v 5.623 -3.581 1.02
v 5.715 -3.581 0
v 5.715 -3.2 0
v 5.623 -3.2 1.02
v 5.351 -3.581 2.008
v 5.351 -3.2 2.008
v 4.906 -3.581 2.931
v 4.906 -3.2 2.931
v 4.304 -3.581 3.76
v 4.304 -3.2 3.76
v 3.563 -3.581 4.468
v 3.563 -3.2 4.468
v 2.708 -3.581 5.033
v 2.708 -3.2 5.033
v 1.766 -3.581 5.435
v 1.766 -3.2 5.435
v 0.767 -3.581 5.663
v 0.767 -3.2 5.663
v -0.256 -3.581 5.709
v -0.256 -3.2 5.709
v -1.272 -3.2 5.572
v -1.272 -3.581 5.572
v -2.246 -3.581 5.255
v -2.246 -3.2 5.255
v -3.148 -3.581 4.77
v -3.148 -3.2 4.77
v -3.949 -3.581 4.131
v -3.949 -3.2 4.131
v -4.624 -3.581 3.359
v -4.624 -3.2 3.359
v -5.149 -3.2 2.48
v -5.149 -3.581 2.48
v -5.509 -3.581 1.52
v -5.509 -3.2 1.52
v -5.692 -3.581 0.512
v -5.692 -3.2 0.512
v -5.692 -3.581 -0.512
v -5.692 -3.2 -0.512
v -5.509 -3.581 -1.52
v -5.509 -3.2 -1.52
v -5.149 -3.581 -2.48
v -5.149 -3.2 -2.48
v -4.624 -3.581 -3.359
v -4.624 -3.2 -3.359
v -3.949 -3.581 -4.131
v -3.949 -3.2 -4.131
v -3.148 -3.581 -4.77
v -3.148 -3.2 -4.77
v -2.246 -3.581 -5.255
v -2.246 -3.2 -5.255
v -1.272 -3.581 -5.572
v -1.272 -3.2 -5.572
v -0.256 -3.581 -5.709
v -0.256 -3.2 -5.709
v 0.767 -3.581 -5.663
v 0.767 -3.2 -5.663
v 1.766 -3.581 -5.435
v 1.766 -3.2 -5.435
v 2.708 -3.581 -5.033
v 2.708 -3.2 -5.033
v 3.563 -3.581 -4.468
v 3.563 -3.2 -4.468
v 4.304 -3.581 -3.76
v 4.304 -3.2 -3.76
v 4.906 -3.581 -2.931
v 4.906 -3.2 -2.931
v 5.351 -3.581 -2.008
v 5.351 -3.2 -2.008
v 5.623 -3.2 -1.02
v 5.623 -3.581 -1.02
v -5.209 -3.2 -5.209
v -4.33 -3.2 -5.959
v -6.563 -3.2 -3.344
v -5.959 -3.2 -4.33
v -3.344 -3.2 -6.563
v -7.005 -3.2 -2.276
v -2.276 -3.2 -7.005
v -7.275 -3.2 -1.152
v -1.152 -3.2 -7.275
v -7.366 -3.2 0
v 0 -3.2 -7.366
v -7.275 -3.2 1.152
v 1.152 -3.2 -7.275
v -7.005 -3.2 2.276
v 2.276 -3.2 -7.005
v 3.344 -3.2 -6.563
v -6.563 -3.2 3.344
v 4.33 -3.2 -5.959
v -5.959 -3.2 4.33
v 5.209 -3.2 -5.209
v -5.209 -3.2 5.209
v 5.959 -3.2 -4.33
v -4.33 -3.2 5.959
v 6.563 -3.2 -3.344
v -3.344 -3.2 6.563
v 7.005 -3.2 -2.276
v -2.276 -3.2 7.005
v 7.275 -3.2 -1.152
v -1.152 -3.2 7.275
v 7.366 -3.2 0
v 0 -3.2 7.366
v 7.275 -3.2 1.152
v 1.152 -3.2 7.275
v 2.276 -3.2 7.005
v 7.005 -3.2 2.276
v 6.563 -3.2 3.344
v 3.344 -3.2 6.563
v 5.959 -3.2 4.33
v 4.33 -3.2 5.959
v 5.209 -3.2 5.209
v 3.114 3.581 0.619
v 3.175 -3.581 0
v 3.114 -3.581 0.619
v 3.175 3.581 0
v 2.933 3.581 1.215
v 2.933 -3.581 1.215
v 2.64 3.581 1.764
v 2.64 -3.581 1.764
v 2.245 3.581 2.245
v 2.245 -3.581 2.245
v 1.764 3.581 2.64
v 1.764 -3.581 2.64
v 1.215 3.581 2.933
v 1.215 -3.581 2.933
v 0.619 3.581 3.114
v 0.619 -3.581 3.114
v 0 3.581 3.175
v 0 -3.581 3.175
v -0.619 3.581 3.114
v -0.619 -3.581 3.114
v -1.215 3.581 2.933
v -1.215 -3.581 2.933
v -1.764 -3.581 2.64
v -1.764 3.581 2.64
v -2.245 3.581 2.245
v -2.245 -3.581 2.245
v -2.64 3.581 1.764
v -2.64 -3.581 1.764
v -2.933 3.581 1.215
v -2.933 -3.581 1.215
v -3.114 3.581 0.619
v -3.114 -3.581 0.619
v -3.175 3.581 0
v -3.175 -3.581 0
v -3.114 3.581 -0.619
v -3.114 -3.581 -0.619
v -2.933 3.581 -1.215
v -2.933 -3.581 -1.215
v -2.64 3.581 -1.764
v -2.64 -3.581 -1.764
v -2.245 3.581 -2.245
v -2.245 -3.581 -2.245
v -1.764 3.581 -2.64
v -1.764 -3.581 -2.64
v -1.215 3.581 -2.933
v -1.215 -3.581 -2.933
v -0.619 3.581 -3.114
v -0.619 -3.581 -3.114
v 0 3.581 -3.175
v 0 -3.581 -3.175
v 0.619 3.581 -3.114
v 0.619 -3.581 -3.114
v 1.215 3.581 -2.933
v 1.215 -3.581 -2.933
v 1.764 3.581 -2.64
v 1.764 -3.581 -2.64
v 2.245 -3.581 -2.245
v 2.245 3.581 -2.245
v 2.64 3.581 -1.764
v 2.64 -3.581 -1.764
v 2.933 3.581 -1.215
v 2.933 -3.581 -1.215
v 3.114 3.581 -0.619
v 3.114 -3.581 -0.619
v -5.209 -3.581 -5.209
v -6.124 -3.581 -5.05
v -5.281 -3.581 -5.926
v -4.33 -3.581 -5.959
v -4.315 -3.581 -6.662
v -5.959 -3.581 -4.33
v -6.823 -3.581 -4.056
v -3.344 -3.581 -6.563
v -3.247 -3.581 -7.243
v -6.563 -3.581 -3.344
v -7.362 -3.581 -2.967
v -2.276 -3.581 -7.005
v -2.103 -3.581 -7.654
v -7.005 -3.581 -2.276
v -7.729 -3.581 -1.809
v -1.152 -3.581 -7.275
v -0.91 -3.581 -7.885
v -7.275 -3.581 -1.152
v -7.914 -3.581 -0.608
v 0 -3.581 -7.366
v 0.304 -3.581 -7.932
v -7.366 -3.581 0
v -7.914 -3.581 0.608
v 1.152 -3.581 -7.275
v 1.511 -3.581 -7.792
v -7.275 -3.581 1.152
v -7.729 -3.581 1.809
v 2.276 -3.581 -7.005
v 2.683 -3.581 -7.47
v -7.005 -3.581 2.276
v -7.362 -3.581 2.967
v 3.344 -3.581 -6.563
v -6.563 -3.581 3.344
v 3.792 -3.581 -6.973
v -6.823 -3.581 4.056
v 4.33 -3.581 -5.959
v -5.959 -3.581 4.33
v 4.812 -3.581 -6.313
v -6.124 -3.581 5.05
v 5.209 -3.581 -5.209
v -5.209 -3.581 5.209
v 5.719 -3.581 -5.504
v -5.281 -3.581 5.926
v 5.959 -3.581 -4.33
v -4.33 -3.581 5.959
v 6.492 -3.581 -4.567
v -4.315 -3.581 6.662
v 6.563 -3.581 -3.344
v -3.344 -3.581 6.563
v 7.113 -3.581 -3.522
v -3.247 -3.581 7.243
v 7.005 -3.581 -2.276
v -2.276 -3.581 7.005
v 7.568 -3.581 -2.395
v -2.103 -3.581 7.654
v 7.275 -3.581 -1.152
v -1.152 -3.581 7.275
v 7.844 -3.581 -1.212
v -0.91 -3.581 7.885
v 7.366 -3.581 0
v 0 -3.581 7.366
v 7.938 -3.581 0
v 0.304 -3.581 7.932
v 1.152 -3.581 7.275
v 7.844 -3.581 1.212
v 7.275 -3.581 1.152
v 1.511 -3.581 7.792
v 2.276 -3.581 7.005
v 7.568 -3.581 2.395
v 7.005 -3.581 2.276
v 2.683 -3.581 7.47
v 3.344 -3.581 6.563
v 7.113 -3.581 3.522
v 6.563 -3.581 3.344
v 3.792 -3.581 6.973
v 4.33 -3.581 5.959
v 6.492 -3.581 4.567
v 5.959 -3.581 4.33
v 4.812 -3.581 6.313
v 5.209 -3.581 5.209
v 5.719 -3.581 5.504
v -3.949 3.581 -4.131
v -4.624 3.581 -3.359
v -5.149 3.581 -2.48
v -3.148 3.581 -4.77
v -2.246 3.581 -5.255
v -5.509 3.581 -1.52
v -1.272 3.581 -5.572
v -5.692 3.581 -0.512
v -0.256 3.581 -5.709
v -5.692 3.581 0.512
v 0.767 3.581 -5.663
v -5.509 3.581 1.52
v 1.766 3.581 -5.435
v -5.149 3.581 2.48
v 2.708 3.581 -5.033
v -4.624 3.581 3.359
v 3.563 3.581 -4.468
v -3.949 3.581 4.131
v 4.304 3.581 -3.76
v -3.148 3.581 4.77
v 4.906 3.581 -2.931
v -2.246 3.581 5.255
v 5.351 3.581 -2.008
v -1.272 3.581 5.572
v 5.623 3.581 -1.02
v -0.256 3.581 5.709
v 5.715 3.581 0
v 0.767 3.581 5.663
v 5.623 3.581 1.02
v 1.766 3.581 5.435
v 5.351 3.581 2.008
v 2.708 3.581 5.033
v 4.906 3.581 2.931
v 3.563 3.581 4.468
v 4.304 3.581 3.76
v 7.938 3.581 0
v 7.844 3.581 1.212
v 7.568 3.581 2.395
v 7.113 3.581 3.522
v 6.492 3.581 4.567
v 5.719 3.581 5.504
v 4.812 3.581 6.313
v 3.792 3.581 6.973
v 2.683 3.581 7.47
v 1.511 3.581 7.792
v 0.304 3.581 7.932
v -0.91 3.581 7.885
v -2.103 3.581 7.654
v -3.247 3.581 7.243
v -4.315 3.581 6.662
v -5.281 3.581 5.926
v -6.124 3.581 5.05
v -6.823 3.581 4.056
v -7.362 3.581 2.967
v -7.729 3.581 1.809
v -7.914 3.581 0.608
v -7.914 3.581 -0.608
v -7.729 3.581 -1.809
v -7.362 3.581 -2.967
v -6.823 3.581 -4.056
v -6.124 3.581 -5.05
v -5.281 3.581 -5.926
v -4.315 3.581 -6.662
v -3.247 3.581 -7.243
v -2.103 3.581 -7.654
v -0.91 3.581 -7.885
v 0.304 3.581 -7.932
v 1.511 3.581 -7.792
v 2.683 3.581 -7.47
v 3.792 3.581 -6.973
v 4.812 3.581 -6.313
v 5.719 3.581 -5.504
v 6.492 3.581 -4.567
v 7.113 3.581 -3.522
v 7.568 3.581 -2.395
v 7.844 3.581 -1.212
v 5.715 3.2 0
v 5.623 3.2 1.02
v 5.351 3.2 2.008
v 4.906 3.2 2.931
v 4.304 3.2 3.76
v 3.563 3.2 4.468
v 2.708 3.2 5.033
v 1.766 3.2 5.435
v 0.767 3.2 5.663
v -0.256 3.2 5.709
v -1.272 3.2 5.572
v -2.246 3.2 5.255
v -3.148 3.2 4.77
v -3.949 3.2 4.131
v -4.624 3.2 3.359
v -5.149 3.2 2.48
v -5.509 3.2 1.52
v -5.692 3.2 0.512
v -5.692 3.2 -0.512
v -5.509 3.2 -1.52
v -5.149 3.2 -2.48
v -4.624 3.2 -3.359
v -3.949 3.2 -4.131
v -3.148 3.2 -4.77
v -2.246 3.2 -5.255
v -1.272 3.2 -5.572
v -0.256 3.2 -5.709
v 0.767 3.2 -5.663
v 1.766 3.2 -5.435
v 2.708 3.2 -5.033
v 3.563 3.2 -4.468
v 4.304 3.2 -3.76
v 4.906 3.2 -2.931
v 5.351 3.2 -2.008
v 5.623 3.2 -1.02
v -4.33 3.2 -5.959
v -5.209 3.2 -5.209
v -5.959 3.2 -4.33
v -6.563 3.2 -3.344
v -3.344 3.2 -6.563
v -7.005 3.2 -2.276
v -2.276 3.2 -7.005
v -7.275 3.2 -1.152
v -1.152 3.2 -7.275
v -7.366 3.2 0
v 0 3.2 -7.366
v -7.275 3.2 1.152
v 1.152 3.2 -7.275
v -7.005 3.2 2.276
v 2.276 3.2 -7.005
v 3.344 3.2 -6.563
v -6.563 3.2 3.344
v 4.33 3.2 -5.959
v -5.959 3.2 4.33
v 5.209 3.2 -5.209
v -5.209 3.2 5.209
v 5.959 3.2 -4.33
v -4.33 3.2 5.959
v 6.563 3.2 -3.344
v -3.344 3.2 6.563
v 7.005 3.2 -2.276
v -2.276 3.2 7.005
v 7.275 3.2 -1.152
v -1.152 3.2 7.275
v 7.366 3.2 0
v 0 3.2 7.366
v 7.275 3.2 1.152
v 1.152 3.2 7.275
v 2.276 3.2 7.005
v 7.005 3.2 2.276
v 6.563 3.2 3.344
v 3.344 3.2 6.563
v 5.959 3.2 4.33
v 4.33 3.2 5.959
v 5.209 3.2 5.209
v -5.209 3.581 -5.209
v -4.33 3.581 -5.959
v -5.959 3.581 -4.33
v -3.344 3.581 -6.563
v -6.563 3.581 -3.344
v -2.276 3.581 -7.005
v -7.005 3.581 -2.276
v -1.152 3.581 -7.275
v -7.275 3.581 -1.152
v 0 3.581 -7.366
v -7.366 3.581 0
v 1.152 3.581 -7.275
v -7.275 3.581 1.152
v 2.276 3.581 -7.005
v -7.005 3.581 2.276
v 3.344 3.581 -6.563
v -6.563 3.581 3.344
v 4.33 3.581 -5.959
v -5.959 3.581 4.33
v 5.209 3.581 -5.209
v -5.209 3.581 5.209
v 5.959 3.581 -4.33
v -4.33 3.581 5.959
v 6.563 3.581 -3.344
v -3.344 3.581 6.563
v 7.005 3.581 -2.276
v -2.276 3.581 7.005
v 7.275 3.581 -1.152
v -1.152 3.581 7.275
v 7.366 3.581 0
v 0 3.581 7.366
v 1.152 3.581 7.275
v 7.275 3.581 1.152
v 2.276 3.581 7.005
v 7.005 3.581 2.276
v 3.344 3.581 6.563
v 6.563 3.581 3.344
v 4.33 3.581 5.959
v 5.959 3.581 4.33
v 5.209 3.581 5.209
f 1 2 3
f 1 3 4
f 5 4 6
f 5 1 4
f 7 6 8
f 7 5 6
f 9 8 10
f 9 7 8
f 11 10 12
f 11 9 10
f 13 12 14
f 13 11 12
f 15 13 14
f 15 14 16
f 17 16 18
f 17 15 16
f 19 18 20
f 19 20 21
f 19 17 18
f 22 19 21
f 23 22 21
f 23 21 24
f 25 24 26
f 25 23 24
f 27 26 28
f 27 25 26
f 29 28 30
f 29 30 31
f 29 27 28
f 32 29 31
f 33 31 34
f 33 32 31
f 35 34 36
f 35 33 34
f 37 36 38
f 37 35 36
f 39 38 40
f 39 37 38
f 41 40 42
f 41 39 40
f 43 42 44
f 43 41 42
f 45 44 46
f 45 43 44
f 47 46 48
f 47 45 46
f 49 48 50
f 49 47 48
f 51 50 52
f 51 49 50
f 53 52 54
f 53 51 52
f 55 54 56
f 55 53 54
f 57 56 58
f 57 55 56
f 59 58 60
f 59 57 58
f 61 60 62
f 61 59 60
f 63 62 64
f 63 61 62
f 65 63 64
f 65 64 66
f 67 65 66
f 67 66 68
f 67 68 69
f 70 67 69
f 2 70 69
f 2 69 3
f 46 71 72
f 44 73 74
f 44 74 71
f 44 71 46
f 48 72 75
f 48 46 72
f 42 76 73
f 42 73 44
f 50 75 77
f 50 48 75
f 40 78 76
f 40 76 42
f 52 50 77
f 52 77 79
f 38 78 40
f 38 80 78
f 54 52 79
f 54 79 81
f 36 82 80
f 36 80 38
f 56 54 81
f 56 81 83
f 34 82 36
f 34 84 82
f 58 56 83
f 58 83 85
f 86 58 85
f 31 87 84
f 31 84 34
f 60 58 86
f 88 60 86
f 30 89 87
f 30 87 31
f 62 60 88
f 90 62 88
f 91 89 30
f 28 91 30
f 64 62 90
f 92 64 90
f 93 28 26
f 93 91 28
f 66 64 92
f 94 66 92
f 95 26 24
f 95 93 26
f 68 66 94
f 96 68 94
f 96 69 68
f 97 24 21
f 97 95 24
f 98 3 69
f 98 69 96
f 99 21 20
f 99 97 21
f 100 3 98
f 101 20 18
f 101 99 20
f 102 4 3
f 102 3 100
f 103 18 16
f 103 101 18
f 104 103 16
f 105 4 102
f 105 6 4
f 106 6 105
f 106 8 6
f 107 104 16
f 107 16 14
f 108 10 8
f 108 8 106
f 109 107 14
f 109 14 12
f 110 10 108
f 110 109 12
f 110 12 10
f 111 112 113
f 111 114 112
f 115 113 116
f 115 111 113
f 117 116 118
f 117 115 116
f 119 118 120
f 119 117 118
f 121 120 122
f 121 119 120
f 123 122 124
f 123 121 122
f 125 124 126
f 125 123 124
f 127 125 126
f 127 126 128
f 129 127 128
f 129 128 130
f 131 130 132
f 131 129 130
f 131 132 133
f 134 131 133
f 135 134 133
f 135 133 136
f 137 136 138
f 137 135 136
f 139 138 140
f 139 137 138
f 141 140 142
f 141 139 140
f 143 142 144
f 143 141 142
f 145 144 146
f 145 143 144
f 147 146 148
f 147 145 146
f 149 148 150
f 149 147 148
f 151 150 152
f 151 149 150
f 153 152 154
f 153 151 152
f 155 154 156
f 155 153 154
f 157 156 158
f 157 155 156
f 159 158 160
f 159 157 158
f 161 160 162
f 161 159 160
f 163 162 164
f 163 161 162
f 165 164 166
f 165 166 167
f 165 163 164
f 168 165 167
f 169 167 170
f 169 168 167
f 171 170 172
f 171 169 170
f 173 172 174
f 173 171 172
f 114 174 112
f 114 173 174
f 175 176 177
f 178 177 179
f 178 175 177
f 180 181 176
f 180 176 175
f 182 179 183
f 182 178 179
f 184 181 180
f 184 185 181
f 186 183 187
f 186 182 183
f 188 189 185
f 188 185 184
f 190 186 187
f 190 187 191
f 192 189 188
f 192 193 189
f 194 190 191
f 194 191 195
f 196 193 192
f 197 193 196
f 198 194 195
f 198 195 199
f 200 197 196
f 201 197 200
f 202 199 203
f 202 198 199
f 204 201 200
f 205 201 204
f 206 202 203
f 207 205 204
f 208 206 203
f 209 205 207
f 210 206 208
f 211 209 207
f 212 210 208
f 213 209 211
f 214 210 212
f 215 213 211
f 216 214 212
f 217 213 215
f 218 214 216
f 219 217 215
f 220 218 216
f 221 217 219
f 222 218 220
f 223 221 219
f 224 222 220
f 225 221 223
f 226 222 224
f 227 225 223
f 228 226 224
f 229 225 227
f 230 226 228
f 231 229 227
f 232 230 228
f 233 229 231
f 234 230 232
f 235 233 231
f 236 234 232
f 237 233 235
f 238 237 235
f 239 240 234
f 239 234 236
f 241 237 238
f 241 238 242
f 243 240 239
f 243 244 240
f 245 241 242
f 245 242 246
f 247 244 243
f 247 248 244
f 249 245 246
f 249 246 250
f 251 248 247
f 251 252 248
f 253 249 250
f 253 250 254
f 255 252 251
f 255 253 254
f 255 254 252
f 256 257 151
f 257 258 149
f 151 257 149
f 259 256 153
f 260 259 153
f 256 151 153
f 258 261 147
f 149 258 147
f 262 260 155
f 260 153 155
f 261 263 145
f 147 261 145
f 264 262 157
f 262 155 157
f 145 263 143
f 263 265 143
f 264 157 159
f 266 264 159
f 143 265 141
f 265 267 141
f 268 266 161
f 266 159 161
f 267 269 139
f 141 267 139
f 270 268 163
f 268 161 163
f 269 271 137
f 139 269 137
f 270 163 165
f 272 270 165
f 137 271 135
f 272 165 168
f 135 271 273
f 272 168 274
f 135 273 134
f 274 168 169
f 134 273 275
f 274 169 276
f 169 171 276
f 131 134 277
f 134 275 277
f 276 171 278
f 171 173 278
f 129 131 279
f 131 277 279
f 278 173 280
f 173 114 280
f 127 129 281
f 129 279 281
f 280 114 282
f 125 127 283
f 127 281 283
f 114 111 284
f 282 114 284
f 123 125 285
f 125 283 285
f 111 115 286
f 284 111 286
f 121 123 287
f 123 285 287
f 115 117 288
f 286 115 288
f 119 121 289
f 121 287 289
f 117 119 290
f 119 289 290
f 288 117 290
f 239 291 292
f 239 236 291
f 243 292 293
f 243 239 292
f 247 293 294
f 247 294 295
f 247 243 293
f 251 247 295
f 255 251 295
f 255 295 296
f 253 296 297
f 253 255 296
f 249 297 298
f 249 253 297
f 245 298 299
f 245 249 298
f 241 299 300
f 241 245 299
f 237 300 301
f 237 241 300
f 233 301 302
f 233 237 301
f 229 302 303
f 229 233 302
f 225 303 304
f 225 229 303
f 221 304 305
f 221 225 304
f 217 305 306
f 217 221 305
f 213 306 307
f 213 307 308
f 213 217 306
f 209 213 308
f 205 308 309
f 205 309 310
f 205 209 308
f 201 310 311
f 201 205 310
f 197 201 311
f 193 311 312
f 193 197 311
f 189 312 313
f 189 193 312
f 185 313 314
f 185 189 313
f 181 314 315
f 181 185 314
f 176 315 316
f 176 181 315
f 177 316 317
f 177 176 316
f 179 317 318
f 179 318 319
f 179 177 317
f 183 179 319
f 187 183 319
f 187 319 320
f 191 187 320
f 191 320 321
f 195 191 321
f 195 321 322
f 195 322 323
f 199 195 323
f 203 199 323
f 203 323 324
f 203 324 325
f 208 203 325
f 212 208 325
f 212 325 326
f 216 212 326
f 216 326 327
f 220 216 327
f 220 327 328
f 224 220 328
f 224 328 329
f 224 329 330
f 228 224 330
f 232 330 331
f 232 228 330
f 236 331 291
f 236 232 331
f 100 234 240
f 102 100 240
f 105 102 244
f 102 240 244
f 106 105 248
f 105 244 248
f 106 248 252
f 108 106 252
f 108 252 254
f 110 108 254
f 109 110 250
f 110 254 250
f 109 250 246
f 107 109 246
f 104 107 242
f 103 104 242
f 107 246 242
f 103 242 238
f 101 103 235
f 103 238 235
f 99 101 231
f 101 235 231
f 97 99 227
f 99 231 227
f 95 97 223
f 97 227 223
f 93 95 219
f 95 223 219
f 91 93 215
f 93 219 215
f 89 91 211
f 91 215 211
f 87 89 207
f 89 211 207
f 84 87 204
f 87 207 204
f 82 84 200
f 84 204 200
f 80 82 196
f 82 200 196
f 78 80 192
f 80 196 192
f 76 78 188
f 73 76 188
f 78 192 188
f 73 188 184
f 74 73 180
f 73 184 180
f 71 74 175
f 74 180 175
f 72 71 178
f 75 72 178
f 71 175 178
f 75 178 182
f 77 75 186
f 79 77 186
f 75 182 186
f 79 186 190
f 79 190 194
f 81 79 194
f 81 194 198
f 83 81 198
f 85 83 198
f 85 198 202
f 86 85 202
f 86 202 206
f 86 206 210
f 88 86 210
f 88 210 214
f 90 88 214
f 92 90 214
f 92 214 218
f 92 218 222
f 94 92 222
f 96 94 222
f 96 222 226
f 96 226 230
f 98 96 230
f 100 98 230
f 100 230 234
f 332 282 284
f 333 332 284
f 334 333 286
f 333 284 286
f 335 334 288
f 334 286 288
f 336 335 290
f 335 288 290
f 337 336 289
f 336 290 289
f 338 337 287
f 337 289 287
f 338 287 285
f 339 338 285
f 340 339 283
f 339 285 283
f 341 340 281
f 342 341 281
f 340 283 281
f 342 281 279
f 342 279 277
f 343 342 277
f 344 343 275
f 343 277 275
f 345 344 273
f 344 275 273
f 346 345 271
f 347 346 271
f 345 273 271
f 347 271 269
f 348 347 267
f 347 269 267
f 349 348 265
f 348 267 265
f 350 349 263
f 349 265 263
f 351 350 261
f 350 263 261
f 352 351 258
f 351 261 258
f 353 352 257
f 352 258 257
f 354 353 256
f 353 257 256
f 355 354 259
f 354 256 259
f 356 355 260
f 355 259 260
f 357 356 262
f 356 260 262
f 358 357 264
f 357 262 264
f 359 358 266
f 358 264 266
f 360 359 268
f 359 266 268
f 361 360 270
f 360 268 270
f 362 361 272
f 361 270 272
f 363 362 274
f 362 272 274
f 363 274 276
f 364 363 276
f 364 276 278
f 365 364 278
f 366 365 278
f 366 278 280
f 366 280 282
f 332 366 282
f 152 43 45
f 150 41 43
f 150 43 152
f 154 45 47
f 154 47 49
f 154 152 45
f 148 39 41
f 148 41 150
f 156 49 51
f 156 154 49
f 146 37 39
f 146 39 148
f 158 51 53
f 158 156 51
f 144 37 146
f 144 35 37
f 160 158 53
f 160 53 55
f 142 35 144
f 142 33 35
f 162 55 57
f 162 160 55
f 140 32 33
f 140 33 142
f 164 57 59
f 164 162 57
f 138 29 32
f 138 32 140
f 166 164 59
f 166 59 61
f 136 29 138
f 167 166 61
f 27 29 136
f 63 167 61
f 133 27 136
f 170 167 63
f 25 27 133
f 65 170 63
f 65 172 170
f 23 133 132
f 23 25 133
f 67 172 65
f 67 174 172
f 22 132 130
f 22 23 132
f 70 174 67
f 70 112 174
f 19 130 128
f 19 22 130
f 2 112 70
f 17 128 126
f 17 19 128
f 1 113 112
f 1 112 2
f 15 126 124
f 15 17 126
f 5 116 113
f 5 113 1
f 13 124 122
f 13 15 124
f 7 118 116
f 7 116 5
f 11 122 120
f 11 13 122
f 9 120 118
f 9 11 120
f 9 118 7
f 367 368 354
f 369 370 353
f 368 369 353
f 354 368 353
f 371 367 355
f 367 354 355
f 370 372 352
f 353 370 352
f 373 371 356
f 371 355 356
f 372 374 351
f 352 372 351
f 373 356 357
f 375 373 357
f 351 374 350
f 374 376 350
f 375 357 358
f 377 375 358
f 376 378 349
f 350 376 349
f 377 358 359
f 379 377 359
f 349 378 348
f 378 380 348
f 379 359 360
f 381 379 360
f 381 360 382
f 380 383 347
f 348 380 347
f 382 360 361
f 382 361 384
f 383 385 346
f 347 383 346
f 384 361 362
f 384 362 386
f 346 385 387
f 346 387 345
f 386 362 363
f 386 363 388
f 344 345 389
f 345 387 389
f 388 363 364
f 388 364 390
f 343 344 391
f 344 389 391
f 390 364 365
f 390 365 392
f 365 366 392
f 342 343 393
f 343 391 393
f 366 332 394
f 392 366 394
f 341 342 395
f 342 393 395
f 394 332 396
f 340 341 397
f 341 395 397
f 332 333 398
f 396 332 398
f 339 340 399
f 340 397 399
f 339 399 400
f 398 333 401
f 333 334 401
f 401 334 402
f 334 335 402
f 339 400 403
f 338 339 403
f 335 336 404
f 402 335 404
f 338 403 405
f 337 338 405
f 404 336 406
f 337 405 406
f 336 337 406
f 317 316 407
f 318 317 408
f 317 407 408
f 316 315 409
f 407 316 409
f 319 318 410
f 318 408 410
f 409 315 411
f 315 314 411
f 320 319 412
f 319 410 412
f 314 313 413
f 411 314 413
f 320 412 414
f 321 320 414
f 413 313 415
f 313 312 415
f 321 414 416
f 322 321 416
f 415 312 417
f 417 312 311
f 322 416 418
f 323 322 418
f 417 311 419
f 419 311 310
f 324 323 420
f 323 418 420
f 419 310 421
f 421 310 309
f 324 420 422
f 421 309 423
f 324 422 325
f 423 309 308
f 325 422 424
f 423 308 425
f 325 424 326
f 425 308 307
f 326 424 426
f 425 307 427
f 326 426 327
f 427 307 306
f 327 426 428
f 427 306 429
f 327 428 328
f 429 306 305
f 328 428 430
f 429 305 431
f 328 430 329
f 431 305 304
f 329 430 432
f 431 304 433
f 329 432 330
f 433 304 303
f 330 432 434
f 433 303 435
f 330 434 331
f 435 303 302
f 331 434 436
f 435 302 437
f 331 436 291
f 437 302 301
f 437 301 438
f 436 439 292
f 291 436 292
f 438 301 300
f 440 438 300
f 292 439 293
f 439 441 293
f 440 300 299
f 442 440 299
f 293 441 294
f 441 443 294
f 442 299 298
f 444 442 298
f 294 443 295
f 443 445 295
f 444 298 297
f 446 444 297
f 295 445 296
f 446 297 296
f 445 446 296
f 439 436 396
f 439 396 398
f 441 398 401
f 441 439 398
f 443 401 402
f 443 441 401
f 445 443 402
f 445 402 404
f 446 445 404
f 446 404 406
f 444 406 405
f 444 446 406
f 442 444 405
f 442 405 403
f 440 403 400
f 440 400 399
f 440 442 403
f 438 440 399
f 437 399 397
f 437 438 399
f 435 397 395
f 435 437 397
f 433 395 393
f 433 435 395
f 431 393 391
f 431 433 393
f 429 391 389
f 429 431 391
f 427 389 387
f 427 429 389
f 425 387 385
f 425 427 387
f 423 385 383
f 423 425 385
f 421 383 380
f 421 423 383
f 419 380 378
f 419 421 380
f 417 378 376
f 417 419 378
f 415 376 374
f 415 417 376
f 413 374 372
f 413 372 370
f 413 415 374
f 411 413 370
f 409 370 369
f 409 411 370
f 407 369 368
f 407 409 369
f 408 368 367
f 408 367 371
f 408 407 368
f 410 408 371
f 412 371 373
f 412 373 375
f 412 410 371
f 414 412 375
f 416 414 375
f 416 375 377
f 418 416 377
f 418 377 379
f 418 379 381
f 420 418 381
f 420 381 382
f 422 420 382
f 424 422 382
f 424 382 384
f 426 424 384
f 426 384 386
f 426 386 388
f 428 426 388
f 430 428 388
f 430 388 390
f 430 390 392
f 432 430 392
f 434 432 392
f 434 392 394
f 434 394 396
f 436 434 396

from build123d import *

# Parameters (mm, degrees)
F0_R     = 7.9375
F0_R_2   = 5.08
F1_DEPTH = 3.5814
F2_R     = 7.366
F2_R_2   = 5.715
F3_DEPTH = 0.381
F4_R     = 5.08
F4_R_2   = 3.175
F5_DEPTH = 3.5814


# Not quite as in the source:
# - a pattern or mirror of a feature is missing from the dataset's text; its kind, count and spacing are read off the source's solid


with BuildPart() as f1:
    # F0 (on Front) → F1 (new body, symmetric)
    with BuildSketch(Plane.XZ):
        Circle(F0_R)
        Circle(F0_R_2, mode=Mode.SUBTRACT)
    extrude(amount=F1_DEPTH, both=True)

    # F2 (on face) → F3 (cut)
    with BuildSketch(Plane.XZ.offset(3.5814)):
        Circle(F2_R)
        Circle(F2_R_2, mode=Mode.SUBTRACT)
    f3 = extrude(amount=-F3_DEPTH, mode=Mode.SUBTRACT)

    # F3_copies: F3 across plane
    add(f3.mirror(Plane.ZX), mode=Mode.SUBTRACT)

    # F4 (on Front) → F5 (join, symmetric)
    with BuildSketch(Plane.XZ):
        Circle(F4_R)
        Circle(F4_R_2, mode=Mode.SUBTRACT)
    extrude(amount=F5_DEPTH, both=True)


solid = f1.part
